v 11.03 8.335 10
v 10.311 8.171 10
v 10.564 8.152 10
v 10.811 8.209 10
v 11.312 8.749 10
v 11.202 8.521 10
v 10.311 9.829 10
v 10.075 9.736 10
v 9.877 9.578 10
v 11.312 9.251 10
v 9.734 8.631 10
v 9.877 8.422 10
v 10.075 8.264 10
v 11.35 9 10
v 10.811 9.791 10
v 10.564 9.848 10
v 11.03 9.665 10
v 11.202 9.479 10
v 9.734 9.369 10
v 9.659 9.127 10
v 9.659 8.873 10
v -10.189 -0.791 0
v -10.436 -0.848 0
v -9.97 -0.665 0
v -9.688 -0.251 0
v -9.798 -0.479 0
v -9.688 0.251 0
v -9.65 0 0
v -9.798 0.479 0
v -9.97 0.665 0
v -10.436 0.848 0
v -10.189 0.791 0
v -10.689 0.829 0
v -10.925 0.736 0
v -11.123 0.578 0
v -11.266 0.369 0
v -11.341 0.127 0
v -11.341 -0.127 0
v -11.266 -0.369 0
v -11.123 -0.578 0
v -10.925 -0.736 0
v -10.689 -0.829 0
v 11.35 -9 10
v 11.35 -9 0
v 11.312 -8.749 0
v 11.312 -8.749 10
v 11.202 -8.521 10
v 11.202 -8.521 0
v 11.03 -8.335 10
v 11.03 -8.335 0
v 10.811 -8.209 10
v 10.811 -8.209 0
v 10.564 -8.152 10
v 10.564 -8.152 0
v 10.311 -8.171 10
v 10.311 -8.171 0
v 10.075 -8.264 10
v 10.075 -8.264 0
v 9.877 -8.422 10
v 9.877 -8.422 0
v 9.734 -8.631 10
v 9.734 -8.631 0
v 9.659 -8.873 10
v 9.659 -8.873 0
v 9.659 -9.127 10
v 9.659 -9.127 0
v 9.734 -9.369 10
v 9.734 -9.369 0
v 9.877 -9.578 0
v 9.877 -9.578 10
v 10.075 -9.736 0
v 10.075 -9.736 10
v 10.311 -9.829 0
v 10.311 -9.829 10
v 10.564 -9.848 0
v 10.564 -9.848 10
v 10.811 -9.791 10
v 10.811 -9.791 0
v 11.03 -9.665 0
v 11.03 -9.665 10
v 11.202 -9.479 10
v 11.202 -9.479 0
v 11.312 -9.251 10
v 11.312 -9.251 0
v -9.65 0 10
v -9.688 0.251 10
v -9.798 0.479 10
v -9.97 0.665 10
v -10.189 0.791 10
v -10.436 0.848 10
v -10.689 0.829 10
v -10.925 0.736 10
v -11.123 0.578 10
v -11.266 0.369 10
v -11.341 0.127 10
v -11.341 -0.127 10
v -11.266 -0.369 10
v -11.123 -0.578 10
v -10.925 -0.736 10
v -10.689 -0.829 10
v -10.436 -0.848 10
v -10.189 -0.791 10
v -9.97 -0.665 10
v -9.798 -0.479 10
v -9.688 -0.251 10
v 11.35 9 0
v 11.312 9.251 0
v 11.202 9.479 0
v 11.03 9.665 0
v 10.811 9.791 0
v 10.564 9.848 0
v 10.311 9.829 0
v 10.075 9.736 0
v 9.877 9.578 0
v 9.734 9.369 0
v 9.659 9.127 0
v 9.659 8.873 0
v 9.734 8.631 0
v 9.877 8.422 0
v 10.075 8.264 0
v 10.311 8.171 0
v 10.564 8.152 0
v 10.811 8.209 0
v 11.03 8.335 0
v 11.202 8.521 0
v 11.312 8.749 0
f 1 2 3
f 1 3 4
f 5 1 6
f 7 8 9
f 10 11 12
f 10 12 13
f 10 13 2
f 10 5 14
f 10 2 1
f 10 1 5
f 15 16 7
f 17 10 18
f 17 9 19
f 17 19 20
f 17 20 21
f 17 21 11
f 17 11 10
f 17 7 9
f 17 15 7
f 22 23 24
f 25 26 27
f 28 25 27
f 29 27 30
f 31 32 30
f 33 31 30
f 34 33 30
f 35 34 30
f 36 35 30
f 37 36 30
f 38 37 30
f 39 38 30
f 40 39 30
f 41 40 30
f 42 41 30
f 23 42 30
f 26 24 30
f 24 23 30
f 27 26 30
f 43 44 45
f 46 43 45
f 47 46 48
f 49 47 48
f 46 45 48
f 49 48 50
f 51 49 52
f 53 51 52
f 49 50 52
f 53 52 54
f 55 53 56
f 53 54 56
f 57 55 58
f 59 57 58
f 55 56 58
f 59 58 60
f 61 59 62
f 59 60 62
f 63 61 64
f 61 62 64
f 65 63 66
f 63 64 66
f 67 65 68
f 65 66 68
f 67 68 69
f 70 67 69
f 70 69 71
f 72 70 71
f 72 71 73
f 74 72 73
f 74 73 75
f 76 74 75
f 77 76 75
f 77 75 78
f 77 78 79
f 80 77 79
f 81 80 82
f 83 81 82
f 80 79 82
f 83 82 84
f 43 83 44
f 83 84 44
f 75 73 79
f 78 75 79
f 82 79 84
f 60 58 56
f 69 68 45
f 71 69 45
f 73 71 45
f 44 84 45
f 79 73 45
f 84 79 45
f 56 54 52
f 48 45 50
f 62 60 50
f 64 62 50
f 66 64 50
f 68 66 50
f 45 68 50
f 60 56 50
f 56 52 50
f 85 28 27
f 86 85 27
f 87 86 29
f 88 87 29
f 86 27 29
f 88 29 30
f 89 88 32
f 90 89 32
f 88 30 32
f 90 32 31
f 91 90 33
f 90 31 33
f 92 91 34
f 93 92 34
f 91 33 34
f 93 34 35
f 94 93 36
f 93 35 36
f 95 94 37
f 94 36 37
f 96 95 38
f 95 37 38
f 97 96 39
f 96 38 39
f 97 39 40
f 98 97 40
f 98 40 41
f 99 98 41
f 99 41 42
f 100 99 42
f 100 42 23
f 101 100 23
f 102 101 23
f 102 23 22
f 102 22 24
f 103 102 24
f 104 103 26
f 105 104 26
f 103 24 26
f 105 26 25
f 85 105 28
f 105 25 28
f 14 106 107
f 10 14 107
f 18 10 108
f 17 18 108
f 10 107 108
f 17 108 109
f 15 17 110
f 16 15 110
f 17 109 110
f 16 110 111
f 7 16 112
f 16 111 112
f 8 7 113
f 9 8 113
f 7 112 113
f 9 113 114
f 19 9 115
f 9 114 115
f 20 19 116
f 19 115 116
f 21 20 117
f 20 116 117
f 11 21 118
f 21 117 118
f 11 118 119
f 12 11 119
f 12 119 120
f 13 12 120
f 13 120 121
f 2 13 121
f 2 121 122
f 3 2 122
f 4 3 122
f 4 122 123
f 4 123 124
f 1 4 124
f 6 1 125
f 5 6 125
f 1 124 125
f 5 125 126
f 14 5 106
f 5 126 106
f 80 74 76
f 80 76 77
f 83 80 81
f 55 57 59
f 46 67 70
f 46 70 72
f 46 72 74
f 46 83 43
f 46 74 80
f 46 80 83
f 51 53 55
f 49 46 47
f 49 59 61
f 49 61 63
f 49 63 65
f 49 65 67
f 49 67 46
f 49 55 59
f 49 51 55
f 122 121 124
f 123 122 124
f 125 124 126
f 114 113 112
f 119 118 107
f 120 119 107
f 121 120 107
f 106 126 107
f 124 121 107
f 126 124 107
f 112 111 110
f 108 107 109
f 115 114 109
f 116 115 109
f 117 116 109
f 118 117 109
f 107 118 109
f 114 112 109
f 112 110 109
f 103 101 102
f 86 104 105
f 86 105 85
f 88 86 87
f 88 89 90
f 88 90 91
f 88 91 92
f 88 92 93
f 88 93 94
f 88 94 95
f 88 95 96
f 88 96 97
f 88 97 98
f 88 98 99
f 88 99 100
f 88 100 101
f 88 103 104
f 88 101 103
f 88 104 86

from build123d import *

# Parameters (mm, degrees)
CYLINDER009_R     = 0.85
CYLINDER009_DEPTH = 10
CYLINDER010_R     = 0.85
CYLINDER010_DEPTH = 10
CYLINDER011_R     = 0.85
CYLINDER011_DEPTH = 10


with BuildPart() as cylinder009:
    # Cylinder009 → Cylinder009 (new body)
    with BuildSketch(Plane(origin=(10.5, 9, 0), x_dir=(1, 0, 0), z_dir=(0, 0, 1))):
        Circle(CYLINDER009_R)
    extrude(amount=CYLINDER009_DEPTH)


with BuildPart() as cylinder010:
    # Cylinder010 → Cylinder010 (new body)
    with BuildSketch(Plane(origin=(10.5, -9, 0), x_dir=(1, 0, 0), z_dir=(0, 0, 1))):
        Circle(CYLINDER010_R)
    extrude(amount=CYLINDER010_DEPTH)


with BuildPart() as cylinder011:
    # Cylinder011 → Cylinder011 (new body)
    with BuildSketch(Plane(origin=(-10.5, 0, 0), x_dir=(1, 0, 0), z_dir=(0, 0, 1))):
        Circle(CYLINDER011_R)
    extrude(amount=CYLINDER011_DEPTH)


solid = Compound([cylinder009.part, cylinder010.part, cylinder011.part])
